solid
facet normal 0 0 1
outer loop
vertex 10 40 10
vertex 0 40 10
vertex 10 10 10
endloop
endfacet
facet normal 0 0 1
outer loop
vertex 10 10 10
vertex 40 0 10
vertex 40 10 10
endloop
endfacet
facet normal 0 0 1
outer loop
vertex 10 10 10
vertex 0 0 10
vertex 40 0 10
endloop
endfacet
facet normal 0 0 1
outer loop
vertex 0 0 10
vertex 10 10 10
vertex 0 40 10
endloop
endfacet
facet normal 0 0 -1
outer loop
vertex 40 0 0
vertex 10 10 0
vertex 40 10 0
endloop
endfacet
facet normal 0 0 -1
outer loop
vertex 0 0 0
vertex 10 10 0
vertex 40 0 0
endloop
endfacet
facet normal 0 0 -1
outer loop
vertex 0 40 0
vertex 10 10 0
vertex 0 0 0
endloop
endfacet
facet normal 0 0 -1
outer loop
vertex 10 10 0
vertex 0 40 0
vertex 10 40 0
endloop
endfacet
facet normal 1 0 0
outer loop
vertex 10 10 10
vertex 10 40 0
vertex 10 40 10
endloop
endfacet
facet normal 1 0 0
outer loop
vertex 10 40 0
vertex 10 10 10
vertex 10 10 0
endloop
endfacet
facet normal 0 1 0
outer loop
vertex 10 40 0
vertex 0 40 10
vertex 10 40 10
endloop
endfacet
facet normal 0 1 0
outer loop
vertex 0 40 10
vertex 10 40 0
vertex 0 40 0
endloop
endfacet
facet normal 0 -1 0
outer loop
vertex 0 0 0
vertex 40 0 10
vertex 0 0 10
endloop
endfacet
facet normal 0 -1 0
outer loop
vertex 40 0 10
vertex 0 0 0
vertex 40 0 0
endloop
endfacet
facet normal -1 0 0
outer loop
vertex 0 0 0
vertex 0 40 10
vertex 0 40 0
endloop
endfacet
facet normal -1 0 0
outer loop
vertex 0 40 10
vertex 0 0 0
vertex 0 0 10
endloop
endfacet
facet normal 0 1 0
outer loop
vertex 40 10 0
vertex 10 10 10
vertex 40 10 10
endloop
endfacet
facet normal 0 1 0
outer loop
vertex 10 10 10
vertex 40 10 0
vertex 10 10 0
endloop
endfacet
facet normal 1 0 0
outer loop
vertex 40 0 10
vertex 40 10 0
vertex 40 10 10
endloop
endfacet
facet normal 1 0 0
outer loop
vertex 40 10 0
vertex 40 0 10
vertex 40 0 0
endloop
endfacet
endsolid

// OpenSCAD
union()
{
    union()
    {
        hull()
        {
            translate([5.0, 5.0, 0.0])
            {
                linear_extrude(height = 10.0, twist = 0.0, scale = 1.0, slices = 1, center = false)
                {
                    scale([10.0, 10.0])
                    {
                        M8();
                    }
                }
            }
            translate([0.0, 30.0, 0.0])
            {
                translate([5.0, 5.0, 0.0])
                {
                    linear_extrude(height = 10.0, twist = 0.0, scale = 1.0, slices = 1, center = false)
                    {
                        scale([10.0, 10.0])
                        {
                            M8();
                        }
                    }
                }
            }
        }
        hull()
        {
            translate([5.0, 5.0, 0.0])
            {
                linear_extrude(height = 10.0, twist = 0.0, scale = 1.0, slices = 1, center = false)
                {
                    scale([10.0, 10.0])
                    {
                        M8();
                    }
                }
            }
            translate([30.0, 0.0, 0.0])
            {
                translate([5.0, 5.0, 0.0])
                {
                    linear_extrude(height = 10.0, twist = 0.0, scale = 1.0, slices = 1, center = false)
                    {
                        scale([10.0, 10.0])
                        {
                            M8();
                        }
                    }
                }
            }
        }
    }
}

module M8()
{
    polygon
    (
        points =
        [
            [-0.5, -0.5], 
            [0.5, -0.5], 
            [0.5, 0.5], 
            [-0.5, 0.5]
        ],
        paths =
        [
            [0, 1, 2, 3]
        ]
    );
}
